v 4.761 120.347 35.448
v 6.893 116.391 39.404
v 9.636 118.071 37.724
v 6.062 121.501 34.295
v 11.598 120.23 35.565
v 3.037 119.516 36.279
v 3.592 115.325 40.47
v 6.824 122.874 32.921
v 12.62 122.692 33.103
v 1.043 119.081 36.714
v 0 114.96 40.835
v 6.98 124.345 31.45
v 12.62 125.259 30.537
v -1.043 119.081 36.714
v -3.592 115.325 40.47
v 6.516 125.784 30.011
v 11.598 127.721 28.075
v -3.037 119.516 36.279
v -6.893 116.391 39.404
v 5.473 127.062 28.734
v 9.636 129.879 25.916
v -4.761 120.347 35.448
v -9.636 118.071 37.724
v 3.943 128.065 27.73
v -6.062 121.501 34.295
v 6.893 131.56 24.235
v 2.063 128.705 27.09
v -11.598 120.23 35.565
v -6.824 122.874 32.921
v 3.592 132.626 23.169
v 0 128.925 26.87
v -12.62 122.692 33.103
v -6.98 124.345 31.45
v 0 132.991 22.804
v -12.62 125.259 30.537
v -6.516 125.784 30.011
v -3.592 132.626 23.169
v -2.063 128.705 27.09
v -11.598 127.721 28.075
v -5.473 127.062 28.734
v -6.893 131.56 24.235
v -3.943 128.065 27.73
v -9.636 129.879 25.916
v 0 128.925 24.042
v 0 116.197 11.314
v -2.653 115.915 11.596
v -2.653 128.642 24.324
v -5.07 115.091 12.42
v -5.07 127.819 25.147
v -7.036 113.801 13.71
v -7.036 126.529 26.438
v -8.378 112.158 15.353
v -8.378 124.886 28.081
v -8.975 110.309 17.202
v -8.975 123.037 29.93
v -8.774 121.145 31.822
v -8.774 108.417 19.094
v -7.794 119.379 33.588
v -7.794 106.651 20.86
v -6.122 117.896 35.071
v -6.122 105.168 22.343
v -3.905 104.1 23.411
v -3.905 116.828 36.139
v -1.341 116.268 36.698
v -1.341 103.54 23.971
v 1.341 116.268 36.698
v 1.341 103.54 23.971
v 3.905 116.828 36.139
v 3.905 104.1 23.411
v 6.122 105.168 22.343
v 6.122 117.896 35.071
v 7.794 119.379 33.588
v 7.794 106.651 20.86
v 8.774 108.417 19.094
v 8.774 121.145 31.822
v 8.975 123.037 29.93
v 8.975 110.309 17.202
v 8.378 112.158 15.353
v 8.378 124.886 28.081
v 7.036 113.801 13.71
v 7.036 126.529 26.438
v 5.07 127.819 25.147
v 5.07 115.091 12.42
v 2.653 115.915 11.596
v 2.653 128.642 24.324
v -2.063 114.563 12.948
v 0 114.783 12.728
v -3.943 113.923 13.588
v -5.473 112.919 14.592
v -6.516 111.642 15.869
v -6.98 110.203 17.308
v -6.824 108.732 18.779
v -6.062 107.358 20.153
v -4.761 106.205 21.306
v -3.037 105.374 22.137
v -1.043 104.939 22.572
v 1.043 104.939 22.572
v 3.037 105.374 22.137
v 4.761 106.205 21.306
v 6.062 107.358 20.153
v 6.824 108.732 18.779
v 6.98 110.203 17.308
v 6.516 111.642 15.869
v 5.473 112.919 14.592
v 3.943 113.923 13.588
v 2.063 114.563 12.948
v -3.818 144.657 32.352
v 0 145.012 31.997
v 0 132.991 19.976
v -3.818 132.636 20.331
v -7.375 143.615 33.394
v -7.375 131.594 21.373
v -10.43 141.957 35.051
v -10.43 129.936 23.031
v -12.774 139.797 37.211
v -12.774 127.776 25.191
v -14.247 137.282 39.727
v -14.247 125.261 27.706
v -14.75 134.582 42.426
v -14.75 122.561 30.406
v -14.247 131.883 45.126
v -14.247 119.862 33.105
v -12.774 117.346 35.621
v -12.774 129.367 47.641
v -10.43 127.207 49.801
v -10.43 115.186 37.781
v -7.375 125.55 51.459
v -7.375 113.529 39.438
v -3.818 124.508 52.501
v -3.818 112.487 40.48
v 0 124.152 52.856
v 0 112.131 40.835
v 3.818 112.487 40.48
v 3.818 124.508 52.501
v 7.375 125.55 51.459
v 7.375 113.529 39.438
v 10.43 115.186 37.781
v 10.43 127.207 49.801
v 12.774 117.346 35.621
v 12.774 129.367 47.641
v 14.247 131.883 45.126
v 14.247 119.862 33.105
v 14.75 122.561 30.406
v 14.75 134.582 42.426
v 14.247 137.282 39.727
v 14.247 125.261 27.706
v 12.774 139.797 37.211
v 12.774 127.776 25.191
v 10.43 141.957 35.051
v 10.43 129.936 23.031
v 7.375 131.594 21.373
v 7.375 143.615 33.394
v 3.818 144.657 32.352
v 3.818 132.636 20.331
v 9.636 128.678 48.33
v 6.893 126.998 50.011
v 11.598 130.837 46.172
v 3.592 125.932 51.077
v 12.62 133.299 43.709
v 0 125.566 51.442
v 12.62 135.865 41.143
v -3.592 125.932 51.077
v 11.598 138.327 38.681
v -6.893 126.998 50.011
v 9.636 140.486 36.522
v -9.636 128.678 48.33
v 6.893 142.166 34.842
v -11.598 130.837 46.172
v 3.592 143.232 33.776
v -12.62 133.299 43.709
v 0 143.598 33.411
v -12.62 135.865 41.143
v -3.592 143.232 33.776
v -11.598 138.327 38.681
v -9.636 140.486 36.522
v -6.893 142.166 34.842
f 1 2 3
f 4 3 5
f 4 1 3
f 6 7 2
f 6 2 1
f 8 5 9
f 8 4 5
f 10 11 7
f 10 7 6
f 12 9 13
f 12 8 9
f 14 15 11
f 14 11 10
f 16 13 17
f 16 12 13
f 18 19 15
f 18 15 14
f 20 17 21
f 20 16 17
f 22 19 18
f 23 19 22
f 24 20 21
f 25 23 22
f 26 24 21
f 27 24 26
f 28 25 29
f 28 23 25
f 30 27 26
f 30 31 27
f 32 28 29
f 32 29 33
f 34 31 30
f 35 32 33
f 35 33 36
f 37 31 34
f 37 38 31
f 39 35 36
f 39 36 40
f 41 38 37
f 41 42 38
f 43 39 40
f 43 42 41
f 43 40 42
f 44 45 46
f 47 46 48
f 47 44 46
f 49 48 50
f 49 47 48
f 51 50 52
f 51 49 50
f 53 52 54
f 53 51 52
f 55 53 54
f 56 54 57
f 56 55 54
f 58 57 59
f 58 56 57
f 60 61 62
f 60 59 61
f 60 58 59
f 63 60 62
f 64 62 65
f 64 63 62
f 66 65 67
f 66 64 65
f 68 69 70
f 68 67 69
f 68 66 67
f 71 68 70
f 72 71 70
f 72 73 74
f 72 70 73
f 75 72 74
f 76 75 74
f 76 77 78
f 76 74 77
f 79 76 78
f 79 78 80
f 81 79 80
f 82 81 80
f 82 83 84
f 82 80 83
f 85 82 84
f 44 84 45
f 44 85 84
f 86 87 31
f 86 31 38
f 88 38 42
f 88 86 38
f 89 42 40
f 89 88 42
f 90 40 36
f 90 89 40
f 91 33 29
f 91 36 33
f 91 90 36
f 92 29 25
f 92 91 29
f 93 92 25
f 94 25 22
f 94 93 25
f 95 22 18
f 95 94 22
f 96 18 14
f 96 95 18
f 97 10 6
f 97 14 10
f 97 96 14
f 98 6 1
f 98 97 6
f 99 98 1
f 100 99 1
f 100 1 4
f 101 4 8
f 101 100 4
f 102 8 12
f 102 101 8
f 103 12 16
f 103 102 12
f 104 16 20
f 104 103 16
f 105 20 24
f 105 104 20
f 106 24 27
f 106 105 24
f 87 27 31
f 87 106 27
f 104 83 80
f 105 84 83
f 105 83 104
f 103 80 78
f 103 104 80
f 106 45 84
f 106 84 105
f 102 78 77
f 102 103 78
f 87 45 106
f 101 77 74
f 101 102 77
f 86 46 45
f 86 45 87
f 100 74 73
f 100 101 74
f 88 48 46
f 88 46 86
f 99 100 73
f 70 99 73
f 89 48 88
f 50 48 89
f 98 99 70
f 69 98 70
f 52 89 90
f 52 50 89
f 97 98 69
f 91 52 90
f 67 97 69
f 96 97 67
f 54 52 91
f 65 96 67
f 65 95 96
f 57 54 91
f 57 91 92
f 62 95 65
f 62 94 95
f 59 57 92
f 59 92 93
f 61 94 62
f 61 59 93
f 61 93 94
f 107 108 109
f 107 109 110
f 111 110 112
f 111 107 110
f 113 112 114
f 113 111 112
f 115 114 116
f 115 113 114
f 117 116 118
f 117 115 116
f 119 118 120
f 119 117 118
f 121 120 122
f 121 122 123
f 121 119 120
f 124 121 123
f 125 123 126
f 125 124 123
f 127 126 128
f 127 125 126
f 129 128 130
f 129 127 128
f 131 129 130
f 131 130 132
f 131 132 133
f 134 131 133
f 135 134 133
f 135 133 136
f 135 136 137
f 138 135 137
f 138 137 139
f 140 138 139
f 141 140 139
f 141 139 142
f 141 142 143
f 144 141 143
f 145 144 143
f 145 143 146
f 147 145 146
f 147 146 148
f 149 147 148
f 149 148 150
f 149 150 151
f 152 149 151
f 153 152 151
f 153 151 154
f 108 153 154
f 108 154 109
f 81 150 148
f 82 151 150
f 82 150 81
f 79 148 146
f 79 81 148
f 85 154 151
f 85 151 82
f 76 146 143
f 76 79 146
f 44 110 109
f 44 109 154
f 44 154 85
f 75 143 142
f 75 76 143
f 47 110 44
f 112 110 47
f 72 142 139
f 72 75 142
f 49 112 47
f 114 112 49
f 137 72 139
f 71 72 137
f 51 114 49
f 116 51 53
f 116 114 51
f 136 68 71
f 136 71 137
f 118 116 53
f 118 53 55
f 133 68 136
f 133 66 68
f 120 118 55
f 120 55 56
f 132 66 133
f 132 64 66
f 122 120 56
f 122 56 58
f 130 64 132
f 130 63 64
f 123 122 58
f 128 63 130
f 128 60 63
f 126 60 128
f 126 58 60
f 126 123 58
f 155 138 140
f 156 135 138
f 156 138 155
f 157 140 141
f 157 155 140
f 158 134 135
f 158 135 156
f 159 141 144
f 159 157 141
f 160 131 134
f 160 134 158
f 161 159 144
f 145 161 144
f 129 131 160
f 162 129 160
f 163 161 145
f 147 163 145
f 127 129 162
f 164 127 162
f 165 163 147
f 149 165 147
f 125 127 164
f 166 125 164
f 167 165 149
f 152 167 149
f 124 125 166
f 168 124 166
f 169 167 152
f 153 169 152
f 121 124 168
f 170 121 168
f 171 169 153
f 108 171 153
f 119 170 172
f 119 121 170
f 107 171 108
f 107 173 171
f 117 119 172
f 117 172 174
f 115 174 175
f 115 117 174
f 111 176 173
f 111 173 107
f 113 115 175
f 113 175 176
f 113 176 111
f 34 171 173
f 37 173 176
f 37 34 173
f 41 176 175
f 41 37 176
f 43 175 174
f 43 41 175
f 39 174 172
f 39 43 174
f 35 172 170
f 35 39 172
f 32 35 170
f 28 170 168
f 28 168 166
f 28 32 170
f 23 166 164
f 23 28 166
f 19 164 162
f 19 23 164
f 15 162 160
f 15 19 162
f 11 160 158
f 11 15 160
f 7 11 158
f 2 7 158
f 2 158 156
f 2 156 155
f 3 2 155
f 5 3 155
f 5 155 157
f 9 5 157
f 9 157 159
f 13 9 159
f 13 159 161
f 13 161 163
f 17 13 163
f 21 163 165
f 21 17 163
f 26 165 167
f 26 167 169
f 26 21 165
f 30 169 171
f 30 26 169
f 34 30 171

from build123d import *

# Parameters (mm, degrees)
CIRPATTERN1_COUNT = 2
CIRPATTERN1_ANGLE = 90


with BuildPart() as part:
    # Sketch1 → Revolve1 (revolve)
    with BuildSketch(Plane(origin=(0, 0, 0), x_dir=(0, 0, -1), z_dir=(1, 0, 0))):
        Polygon((-51.442018331, 125.566457335), (-40.835416614, 114.959855617), (-36.769552622, 119.025719609), (-22.627416998, 104.883583986), (-24.04163056, 103.469370423), (-36.769552622, 116.197292485), (-40.835416614, 112.131428493), (-52.856231894, 124.152243773), align=None)
    revolve1 = revolve(axis=Axis((0, 92.155661924, 0), (0, 0.7071067811865461, 0.707106781186549)))

    # CirPattern1: Revolve1 ×2 about axis
    cirpattern1_axis = Axis((0, 46.077830962, -46.077830962), (0, 0.707106781, 0.707106781))
    for i in range(1, CIRPATTERN1_COUNT):
        add(revolve1.rotate(cirpattern1_axis, i * CIRPATTERN1_ANGLE / (CIRPATTERN1_COUNT - 1)))


solid = part.part
